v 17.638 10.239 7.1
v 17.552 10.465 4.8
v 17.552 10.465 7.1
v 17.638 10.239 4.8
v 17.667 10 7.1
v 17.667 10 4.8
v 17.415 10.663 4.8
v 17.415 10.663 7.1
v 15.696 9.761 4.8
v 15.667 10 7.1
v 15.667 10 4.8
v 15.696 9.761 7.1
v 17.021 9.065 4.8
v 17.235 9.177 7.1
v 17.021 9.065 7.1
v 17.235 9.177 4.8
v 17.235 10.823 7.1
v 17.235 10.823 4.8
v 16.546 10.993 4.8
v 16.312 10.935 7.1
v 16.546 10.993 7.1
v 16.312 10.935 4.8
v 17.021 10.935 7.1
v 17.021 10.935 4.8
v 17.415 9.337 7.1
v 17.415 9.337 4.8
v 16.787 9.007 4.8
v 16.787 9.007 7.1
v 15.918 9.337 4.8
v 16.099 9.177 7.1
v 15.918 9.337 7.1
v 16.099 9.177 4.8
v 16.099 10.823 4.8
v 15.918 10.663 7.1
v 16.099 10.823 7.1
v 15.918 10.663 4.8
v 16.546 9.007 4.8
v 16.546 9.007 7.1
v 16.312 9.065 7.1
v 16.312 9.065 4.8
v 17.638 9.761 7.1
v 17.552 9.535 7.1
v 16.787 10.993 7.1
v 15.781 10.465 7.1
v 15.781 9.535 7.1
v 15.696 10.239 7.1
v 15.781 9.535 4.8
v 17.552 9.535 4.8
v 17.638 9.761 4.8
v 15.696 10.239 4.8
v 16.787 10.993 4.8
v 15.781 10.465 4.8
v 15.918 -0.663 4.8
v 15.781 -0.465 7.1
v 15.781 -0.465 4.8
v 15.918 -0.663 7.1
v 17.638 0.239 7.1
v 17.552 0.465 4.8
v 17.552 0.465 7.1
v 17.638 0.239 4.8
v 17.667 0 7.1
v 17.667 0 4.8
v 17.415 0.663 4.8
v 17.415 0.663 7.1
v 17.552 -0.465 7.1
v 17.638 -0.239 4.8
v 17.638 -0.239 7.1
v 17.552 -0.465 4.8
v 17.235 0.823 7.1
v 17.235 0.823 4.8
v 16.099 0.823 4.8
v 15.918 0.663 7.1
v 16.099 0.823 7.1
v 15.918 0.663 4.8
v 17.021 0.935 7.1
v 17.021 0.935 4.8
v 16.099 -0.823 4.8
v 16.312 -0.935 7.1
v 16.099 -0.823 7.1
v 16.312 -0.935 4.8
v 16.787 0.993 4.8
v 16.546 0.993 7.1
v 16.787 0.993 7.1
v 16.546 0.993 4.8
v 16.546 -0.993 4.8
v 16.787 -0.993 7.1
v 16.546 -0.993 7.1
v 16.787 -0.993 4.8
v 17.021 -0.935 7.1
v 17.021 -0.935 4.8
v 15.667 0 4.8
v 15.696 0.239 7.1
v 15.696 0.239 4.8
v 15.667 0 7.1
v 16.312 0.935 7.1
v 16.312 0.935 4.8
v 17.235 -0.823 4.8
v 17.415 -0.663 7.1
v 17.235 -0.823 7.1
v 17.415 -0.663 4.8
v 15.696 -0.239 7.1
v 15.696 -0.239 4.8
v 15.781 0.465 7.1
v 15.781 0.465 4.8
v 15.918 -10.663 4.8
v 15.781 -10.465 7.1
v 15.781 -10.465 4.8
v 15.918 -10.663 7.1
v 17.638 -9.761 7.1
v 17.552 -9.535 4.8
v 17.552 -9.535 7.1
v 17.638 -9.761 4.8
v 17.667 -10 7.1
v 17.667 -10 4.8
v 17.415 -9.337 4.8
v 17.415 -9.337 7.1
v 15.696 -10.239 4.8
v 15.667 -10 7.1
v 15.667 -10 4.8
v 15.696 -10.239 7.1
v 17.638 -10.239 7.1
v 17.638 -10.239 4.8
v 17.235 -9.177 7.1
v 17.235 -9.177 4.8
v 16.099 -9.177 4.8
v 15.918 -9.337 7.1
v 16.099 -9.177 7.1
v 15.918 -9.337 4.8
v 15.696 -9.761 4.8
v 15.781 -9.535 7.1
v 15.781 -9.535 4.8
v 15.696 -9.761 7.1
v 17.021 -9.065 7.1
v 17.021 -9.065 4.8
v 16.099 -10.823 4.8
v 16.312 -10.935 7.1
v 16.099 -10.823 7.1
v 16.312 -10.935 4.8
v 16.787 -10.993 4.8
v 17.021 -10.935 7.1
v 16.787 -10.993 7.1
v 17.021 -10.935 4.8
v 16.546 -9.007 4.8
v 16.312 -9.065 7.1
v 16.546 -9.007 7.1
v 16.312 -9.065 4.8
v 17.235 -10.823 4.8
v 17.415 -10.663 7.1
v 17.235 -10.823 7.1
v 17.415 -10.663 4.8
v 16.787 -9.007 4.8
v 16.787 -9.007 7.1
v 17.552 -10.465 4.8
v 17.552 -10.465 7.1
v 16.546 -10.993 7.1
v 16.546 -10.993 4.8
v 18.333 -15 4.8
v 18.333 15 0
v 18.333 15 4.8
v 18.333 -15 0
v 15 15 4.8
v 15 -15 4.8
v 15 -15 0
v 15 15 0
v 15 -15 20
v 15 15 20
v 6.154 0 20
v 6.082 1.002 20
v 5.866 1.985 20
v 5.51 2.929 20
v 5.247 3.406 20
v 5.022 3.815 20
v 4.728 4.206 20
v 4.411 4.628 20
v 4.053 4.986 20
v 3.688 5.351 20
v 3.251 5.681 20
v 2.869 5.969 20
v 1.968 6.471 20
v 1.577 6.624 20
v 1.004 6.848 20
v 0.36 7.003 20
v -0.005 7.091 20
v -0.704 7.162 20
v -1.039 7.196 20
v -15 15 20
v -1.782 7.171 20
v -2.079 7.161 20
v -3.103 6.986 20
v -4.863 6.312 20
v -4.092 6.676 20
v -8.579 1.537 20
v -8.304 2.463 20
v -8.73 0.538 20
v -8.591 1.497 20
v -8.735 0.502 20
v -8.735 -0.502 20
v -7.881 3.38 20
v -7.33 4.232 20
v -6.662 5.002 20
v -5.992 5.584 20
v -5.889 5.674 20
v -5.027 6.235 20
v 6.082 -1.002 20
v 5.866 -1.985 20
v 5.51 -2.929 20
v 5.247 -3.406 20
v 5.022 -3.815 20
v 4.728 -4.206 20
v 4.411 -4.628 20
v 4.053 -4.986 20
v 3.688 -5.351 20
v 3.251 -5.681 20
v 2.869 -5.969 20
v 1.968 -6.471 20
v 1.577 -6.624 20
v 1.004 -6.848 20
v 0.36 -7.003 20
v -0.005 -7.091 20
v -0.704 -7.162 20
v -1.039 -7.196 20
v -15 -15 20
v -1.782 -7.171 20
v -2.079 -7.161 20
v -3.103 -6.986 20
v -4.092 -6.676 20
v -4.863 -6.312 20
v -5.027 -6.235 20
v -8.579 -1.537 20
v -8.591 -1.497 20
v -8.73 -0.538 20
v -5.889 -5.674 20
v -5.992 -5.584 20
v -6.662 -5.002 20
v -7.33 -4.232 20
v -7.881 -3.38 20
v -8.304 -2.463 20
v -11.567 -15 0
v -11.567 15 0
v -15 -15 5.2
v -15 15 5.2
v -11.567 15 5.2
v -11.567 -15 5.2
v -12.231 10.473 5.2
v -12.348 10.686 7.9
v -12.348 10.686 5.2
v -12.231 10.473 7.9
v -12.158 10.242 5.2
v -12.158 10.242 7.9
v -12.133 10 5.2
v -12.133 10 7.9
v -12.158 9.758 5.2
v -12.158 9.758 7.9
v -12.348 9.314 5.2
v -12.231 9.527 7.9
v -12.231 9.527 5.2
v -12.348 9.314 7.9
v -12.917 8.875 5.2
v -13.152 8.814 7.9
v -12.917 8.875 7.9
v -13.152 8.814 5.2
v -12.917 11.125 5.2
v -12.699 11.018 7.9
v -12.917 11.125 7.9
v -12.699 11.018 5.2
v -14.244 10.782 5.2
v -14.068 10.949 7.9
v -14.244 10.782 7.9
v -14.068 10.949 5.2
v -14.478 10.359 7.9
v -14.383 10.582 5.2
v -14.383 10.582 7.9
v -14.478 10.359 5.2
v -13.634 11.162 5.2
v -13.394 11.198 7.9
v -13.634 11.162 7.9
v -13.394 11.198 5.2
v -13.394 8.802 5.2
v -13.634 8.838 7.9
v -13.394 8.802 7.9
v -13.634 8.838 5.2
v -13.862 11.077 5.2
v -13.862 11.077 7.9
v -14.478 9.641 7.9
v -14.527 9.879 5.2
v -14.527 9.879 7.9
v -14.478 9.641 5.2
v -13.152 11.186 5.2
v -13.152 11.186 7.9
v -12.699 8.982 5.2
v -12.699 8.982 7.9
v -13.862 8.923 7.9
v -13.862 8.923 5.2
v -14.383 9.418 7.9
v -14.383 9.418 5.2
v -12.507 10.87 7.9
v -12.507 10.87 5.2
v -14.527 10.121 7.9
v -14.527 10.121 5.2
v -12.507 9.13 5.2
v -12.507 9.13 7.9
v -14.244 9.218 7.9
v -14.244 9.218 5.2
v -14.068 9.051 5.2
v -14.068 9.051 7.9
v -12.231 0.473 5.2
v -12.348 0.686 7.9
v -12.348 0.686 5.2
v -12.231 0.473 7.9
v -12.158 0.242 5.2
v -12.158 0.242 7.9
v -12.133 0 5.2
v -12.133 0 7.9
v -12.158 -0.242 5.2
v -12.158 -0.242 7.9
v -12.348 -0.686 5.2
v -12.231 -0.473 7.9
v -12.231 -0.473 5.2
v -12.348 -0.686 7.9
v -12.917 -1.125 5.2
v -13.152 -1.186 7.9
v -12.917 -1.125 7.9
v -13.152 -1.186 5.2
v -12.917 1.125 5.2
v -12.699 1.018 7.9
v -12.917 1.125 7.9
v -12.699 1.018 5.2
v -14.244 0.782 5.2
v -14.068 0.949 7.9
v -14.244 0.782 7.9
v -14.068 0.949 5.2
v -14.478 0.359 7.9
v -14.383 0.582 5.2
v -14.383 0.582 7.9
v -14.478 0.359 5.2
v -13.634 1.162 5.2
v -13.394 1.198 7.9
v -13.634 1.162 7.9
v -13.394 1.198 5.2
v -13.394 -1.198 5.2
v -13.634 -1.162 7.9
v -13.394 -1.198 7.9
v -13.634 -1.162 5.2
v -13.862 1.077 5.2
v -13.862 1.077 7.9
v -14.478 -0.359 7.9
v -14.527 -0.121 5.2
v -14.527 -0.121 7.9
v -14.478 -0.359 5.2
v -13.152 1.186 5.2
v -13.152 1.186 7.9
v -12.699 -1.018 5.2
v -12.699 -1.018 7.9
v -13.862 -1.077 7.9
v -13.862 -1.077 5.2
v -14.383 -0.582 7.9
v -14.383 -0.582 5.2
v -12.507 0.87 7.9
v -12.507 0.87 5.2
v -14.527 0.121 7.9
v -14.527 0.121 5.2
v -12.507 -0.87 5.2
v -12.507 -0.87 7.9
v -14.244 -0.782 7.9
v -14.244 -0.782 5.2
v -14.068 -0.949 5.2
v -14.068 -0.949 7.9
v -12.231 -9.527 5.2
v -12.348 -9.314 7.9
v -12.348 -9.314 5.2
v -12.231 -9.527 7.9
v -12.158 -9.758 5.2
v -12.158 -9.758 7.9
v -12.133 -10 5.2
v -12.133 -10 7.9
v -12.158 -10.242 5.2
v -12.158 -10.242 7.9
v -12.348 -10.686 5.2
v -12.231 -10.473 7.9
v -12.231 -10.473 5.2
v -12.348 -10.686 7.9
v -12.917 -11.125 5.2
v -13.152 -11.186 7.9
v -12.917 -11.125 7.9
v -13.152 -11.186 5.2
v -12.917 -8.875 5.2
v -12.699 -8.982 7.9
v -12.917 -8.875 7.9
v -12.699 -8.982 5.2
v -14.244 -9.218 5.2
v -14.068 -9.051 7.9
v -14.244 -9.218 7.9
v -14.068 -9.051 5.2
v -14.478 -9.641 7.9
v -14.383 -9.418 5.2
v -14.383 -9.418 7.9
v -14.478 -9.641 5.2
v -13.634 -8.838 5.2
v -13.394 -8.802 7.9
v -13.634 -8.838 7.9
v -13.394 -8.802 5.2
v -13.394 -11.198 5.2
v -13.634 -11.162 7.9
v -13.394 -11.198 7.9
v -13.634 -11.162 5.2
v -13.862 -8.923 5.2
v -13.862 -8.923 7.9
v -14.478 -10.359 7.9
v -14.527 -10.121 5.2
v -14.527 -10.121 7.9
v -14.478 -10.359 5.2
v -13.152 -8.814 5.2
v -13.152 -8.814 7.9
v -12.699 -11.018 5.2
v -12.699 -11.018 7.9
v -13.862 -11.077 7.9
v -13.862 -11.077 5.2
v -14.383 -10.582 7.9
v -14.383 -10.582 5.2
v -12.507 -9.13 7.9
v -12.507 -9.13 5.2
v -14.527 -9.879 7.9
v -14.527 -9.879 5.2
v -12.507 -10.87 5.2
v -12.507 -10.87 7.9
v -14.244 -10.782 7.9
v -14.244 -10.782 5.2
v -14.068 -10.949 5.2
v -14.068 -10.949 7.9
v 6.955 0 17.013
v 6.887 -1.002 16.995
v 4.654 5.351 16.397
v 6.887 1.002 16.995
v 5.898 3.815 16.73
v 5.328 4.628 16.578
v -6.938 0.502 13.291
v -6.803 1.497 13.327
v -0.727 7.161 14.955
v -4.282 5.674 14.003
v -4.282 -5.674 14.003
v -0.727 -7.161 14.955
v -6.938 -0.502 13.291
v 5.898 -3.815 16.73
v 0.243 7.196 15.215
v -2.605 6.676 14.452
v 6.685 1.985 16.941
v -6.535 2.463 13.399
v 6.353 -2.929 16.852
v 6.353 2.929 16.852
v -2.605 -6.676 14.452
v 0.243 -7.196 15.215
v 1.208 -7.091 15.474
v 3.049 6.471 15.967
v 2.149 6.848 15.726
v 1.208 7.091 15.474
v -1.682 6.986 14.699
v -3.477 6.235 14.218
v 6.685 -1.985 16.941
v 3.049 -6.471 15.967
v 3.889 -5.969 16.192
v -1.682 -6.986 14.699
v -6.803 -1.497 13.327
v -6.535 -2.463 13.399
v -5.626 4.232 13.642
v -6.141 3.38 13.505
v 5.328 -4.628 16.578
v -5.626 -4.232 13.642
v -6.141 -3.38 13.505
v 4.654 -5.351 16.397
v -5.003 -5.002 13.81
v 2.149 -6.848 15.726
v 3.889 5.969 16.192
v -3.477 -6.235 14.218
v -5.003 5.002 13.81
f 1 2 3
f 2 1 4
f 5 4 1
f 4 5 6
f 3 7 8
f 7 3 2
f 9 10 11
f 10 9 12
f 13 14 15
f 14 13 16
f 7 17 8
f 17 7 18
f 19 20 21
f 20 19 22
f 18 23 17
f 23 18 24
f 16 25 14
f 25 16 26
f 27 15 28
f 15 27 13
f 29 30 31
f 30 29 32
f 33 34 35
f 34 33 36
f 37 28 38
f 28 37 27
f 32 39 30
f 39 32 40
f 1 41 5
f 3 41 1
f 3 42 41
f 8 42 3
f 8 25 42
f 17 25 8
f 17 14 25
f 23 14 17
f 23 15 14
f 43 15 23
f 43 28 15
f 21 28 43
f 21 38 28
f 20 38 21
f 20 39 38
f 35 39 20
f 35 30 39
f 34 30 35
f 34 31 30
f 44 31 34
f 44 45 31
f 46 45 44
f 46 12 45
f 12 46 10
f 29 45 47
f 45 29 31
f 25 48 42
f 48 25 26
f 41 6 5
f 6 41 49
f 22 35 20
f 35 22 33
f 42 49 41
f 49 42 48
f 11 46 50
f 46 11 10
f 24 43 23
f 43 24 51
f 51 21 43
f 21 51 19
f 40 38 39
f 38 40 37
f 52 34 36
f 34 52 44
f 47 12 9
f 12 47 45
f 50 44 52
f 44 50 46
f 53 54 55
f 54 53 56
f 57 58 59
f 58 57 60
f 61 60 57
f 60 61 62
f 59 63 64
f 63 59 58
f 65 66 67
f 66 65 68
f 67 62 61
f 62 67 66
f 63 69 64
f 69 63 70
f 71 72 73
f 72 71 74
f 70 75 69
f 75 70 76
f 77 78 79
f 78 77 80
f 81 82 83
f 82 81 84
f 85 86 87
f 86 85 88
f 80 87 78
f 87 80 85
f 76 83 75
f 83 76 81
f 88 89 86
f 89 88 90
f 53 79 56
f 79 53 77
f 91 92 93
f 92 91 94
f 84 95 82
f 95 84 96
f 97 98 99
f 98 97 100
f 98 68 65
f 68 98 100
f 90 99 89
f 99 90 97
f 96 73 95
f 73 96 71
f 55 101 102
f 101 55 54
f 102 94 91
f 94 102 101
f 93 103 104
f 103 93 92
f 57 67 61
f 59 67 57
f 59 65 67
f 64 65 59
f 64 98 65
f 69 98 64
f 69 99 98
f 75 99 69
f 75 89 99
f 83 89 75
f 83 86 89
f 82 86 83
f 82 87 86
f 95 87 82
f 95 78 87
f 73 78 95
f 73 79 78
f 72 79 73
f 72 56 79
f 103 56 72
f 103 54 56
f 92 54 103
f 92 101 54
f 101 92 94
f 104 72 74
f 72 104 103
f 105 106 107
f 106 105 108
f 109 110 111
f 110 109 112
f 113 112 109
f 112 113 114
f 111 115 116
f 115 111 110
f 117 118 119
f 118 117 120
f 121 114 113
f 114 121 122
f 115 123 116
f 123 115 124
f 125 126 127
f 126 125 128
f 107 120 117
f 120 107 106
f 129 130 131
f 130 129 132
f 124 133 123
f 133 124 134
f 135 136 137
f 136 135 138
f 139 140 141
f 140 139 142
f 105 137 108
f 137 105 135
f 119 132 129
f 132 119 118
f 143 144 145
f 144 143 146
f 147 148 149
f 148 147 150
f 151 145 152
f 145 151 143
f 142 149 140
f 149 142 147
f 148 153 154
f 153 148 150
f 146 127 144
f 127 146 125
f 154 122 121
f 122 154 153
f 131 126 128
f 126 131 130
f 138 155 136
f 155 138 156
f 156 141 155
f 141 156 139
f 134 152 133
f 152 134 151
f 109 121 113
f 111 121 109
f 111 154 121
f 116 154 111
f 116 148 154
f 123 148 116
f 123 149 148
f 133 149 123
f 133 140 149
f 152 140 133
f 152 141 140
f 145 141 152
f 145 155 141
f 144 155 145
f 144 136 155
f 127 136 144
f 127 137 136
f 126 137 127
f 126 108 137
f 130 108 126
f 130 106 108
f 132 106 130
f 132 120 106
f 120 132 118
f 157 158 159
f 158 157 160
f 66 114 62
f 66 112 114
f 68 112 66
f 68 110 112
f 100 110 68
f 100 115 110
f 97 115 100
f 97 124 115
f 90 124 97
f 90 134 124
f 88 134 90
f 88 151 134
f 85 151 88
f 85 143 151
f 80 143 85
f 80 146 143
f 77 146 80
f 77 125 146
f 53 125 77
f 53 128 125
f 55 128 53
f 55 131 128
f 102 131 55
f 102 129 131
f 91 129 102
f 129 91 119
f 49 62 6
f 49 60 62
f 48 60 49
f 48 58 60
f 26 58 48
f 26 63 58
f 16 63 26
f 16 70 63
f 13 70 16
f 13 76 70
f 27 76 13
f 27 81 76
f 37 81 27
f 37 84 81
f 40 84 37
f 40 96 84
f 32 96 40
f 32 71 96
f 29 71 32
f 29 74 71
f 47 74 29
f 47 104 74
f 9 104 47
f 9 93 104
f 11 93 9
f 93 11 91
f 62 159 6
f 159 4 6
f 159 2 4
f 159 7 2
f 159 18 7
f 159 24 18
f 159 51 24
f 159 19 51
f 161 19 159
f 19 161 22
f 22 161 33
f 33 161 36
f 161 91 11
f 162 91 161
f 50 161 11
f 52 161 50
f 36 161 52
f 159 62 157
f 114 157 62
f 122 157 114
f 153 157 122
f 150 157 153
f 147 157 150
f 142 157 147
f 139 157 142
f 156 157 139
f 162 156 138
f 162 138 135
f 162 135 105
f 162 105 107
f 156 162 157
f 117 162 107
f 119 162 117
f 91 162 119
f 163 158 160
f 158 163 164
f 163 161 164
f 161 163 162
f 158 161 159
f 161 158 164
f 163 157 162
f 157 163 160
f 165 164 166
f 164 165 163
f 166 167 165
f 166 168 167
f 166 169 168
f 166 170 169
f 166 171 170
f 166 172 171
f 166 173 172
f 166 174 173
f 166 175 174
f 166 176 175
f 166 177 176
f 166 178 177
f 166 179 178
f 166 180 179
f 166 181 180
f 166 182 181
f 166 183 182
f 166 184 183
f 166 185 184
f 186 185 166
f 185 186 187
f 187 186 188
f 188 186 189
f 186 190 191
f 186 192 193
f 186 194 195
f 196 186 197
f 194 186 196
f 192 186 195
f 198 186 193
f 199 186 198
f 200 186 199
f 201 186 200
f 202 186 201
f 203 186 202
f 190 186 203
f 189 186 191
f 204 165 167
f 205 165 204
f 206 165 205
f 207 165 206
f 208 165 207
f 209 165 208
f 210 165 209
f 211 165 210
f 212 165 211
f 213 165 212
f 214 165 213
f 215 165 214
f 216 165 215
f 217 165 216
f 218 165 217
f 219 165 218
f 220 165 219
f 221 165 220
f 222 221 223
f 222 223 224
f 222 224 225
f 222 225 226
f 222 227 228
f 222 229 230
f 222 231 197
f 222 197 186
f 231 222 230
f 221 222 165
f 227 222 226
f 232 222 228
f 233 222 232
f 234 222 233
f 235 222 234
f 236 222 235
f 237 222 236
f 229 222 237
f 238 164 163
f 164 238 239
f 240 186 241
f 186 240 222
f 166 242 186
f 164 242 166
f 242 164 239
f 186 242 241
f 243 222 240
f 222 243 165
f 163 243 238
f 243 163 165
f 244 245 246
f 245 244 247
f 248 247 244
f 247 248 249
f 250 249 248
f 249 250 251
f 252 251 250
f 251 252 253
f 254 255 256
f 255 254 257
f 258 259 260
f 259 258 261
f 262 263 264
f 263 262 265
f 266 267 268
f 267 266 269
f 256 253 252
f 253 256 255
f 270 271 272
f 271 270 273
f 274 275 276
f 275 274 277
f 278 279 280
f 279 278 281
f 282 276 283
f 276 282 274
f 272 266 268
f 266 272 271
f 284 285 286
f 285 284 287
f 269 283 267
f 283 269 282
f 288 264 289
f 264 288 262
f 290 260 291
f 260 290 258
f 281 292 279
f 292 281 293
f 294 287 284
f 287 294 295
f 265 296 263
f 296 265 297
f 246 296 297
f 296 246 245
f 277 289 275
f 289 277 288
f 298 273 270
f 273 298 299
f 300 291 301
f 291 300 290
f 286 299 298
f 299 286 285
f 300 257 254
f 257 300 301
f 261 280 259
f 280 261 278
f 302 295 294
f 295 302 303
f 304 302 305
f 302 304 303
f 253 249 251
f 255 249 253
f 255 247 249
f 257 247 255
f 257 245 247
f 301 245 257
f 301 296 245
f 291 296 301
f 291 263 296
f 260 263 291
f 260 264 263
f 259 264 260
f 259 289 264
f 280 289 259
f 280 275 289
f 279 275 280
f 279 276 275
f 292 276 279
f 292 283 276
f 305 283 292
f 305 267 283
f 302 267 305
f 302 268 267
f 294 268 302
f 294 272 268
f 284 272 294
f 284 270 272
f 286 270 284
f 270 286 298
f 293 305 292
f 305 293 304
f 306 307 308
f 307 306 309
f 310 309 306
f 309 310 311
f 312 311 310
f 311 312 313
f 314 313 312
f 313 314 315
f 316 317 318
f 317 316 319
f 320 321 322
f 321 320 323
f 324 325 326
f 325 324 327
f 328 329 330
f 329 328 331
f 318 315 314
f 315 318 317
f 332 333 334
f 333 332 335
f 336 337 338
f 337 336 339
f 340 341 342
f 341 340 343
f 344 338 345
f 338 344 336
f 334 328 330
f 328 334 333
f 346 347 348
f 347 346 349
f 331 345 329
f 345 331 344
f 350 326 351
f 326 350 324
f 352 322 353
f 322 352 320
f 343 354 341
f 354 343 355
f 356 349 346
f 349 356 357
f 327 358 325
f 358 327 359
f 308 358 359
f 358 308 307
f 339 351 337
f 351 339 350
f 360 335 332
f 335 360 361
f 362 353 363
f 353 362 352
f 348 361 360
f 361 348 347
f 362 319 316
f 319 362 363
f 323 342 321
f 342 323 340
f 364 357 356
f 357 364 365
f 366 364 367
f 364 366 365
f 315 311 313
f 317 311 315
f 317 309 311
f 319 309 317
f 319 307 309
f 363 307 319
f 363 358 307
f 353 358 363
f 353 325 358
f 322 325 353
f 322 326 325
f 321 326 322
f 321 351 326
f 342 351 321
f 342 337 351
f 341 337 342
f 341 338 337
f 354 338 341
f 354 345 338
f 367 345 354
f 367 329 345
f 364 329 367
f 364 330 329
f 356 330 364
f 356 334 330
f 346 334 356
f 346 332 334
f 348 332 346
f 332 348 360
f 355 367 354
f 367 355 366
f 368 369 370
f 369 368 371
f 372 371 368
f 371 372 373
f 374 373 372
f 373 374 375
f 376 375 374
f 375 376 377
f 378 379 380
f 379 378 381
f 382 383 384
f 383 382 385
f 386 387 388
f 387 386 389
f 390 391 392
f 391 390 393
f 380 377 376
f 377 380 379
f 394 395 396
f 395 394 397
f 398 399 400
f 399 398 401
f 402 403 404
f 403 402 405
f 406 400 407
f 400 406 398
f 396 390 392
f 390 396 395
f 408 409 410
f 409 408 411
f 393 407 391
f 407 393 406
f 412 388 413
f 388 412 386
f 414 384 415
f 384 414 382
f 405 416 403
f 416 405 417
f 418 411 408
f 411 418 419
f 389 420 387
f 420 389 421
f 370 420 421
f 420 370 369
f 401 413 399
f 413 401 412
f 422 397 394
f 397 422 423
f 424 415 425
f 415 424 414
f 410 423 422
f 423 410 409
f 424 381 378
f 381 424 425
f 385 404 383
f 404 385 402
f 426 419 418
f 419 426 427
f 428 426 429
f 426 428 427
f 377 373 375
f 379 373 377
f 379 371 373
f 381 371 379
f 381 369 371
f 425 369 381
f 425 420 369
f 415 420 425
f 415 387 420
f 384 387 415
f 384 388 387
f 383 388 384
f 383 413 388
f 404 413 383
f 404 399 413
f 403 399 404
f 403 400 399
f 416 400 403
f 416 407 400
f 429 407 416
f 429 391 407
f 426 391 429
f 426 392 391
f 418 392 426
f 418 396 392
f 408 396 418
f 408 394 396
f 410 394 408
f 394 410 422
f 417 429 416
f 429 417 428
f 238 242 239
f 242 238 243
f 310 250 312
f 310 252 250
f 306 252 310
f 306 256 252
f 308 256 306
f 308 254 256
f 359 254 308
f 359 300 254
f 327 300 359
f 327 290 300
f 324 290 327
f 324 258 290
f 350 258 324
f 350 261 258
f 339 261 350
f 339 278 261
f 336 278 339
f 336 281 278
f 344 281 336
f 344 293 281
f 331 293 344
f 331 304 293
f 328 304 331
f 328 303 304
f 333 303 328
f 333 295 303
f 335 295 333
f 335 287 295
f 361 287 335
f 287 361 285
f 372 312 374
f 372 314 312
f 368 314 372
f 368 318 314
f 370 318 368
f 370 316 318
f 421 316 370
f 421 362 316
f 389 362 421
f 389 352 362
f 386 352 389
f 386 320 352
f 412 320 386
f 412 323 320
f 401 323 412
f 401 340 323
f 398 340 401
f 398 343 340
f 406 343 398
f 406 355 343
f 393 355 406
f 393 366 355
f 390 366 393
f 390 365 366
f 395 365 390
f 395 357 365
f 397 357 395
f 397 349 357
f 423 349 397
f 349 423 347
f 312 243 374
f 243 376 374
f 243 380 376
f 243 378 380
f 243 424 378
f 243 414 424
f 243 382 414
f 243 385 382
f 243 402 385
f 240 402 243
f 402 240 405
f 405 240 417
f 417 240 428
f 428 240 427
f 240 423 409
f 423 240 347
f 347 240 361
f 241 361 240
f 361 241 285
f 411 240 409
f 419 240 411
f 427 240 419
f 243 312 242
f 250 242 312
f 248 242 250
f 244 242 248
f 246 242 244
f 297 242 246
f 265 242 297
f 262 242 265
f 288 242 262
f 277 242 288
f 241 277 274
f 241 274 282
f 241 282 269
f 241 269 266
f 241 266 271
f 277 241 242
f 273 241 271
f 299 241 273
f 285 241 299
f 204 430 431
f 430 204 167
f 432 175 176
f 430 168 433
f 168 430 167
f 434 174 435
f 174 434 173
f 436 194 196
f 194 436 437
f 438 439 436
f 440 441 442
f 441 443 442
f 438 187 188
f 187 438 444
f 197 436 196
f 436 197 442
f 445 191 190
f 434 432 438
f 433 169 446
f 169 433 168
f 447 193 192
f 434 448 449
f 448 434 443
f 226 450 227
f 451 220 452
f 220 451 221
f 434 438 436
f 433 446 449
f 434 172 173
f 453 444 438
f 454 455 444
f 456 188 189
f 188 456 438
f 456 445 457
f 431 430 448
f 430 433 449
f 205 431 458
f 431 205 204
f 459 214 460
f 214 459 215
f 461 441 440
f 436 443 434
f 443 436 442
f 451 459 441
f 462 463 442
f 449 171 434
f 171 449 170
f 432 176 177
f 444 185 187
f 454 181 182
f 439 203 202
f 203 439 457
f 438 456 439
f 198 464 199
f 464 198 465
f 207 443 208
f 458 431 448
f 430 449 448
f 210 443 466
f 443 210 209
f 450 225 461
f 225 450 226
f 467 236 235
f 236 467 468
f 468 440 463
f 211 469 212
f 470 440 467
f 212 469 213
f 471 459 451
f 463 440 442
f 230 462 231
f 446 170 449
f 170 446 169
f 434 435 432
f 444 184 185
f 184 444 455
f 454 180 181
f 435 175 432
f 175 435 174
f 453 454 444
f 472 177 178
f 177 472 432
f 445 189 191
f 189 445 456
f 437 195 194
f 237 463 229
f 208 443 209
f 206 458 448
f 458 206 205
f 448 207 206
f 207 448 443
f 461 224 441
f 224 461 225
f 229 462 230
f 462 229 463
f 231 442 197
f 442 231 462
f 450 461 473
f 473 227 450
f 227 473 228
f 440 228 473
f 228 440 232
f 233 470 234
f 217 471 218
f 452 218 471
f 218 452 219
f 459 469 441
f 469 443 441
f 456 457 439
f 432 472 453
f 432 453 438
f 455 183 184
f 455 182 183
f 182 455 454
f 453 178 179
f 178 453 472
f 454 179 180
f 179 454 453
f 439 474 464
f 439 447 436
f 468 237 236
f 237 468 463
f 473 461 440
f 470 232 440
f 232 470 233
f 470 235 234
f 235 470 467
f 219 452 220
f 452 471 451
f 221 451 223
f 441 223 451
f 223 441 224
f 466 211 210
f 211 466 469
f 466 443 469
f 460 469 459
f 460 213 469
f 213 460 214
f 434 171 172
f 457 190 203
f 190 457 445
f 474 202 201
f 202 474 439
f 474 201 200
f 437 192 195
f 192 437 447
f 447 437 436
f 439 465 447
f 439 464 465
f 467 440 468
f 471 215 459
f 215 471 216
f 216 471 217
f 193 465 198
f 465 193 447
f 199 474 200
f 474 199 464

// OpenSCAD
// file: ../base.scad
// The x-axis has the connection to the other units
// There is one connection peg per x
// Minimum unit is x=1, y=1, z=1
// If you have x=1, then the x-axis will be extended 
// with 1/3 for the connectors 
// the female version will can still be used and therefore
// counted within the unit

/* [Setup Parameters] */
$fa = 8;
$fs = 0.25;


module base(x,y,z) {
    u = 10;
    t = u;

    width = u*x;
    depth = u*y;
    height = t*z;

    margin = 0.2;

    male_connection_d = 2;
    female_connection_d = male_connection_d+margin*2;
    connector_width = u/3;
    connector_height = t/2;

    module connector(width, height, cylinder_height, cylinder_d) {
        translate([0, 0, 0])
        union() {
            translate([0, 0, height/2])
            cube([width, depth, height], center=true);
            for (i = [1:1:y]) {
                translate([0, depth/2+u/2-(u)*i, height-0.1])
                cylinder(h=cylinder_height+0.1, d=cylinder_d);
            }
        }
    }

    module male_connector() {
        width = connector_width;
        height = connector_height-margin;
        cylinder_height = connector_height/2-margin;
        cylinder_d = male_connection_d;

        connector(width, height, cylinder_height, cylinder_d);
    }

    module inverted_female_connecor() {
        width = connector_width+margin;
        height = connector_height+margin;
        cylinder_height = connector_height/2+margin;
        cylinder_d = female_connection_d;

        connector(width, height, cylinder_height, cylinder_d);
    }

    difference() {
        union() {
            translate([0, 0, height/2])
            cube([width, depth, height], center=true);
            translate([width/2+connector_width/2, 0, 0])
            male_connector();
        }
        union() {
            translate([-width/2+connector_width/2, 0, 0])
            inverted_female_connecor();
        }
    }
}


//base(2,7,2);

module connector(y) {
    u = 10;
}
// main file
include <../base.scad>

flux_cleaner_d = 14.4;
flux_cleaner_h = 7.2;

xunits = 3;
yunits = 3;
zunits = 2;

difference() {
    base(xunits,yunits,zunits);

    #translate([0, 0, zunits*10-flux_cleaner_h+2.35])
    rotate([0,-15,0])
    cylinder(h=flux_cleaner_h, d=flux_cleaner_d);
}
